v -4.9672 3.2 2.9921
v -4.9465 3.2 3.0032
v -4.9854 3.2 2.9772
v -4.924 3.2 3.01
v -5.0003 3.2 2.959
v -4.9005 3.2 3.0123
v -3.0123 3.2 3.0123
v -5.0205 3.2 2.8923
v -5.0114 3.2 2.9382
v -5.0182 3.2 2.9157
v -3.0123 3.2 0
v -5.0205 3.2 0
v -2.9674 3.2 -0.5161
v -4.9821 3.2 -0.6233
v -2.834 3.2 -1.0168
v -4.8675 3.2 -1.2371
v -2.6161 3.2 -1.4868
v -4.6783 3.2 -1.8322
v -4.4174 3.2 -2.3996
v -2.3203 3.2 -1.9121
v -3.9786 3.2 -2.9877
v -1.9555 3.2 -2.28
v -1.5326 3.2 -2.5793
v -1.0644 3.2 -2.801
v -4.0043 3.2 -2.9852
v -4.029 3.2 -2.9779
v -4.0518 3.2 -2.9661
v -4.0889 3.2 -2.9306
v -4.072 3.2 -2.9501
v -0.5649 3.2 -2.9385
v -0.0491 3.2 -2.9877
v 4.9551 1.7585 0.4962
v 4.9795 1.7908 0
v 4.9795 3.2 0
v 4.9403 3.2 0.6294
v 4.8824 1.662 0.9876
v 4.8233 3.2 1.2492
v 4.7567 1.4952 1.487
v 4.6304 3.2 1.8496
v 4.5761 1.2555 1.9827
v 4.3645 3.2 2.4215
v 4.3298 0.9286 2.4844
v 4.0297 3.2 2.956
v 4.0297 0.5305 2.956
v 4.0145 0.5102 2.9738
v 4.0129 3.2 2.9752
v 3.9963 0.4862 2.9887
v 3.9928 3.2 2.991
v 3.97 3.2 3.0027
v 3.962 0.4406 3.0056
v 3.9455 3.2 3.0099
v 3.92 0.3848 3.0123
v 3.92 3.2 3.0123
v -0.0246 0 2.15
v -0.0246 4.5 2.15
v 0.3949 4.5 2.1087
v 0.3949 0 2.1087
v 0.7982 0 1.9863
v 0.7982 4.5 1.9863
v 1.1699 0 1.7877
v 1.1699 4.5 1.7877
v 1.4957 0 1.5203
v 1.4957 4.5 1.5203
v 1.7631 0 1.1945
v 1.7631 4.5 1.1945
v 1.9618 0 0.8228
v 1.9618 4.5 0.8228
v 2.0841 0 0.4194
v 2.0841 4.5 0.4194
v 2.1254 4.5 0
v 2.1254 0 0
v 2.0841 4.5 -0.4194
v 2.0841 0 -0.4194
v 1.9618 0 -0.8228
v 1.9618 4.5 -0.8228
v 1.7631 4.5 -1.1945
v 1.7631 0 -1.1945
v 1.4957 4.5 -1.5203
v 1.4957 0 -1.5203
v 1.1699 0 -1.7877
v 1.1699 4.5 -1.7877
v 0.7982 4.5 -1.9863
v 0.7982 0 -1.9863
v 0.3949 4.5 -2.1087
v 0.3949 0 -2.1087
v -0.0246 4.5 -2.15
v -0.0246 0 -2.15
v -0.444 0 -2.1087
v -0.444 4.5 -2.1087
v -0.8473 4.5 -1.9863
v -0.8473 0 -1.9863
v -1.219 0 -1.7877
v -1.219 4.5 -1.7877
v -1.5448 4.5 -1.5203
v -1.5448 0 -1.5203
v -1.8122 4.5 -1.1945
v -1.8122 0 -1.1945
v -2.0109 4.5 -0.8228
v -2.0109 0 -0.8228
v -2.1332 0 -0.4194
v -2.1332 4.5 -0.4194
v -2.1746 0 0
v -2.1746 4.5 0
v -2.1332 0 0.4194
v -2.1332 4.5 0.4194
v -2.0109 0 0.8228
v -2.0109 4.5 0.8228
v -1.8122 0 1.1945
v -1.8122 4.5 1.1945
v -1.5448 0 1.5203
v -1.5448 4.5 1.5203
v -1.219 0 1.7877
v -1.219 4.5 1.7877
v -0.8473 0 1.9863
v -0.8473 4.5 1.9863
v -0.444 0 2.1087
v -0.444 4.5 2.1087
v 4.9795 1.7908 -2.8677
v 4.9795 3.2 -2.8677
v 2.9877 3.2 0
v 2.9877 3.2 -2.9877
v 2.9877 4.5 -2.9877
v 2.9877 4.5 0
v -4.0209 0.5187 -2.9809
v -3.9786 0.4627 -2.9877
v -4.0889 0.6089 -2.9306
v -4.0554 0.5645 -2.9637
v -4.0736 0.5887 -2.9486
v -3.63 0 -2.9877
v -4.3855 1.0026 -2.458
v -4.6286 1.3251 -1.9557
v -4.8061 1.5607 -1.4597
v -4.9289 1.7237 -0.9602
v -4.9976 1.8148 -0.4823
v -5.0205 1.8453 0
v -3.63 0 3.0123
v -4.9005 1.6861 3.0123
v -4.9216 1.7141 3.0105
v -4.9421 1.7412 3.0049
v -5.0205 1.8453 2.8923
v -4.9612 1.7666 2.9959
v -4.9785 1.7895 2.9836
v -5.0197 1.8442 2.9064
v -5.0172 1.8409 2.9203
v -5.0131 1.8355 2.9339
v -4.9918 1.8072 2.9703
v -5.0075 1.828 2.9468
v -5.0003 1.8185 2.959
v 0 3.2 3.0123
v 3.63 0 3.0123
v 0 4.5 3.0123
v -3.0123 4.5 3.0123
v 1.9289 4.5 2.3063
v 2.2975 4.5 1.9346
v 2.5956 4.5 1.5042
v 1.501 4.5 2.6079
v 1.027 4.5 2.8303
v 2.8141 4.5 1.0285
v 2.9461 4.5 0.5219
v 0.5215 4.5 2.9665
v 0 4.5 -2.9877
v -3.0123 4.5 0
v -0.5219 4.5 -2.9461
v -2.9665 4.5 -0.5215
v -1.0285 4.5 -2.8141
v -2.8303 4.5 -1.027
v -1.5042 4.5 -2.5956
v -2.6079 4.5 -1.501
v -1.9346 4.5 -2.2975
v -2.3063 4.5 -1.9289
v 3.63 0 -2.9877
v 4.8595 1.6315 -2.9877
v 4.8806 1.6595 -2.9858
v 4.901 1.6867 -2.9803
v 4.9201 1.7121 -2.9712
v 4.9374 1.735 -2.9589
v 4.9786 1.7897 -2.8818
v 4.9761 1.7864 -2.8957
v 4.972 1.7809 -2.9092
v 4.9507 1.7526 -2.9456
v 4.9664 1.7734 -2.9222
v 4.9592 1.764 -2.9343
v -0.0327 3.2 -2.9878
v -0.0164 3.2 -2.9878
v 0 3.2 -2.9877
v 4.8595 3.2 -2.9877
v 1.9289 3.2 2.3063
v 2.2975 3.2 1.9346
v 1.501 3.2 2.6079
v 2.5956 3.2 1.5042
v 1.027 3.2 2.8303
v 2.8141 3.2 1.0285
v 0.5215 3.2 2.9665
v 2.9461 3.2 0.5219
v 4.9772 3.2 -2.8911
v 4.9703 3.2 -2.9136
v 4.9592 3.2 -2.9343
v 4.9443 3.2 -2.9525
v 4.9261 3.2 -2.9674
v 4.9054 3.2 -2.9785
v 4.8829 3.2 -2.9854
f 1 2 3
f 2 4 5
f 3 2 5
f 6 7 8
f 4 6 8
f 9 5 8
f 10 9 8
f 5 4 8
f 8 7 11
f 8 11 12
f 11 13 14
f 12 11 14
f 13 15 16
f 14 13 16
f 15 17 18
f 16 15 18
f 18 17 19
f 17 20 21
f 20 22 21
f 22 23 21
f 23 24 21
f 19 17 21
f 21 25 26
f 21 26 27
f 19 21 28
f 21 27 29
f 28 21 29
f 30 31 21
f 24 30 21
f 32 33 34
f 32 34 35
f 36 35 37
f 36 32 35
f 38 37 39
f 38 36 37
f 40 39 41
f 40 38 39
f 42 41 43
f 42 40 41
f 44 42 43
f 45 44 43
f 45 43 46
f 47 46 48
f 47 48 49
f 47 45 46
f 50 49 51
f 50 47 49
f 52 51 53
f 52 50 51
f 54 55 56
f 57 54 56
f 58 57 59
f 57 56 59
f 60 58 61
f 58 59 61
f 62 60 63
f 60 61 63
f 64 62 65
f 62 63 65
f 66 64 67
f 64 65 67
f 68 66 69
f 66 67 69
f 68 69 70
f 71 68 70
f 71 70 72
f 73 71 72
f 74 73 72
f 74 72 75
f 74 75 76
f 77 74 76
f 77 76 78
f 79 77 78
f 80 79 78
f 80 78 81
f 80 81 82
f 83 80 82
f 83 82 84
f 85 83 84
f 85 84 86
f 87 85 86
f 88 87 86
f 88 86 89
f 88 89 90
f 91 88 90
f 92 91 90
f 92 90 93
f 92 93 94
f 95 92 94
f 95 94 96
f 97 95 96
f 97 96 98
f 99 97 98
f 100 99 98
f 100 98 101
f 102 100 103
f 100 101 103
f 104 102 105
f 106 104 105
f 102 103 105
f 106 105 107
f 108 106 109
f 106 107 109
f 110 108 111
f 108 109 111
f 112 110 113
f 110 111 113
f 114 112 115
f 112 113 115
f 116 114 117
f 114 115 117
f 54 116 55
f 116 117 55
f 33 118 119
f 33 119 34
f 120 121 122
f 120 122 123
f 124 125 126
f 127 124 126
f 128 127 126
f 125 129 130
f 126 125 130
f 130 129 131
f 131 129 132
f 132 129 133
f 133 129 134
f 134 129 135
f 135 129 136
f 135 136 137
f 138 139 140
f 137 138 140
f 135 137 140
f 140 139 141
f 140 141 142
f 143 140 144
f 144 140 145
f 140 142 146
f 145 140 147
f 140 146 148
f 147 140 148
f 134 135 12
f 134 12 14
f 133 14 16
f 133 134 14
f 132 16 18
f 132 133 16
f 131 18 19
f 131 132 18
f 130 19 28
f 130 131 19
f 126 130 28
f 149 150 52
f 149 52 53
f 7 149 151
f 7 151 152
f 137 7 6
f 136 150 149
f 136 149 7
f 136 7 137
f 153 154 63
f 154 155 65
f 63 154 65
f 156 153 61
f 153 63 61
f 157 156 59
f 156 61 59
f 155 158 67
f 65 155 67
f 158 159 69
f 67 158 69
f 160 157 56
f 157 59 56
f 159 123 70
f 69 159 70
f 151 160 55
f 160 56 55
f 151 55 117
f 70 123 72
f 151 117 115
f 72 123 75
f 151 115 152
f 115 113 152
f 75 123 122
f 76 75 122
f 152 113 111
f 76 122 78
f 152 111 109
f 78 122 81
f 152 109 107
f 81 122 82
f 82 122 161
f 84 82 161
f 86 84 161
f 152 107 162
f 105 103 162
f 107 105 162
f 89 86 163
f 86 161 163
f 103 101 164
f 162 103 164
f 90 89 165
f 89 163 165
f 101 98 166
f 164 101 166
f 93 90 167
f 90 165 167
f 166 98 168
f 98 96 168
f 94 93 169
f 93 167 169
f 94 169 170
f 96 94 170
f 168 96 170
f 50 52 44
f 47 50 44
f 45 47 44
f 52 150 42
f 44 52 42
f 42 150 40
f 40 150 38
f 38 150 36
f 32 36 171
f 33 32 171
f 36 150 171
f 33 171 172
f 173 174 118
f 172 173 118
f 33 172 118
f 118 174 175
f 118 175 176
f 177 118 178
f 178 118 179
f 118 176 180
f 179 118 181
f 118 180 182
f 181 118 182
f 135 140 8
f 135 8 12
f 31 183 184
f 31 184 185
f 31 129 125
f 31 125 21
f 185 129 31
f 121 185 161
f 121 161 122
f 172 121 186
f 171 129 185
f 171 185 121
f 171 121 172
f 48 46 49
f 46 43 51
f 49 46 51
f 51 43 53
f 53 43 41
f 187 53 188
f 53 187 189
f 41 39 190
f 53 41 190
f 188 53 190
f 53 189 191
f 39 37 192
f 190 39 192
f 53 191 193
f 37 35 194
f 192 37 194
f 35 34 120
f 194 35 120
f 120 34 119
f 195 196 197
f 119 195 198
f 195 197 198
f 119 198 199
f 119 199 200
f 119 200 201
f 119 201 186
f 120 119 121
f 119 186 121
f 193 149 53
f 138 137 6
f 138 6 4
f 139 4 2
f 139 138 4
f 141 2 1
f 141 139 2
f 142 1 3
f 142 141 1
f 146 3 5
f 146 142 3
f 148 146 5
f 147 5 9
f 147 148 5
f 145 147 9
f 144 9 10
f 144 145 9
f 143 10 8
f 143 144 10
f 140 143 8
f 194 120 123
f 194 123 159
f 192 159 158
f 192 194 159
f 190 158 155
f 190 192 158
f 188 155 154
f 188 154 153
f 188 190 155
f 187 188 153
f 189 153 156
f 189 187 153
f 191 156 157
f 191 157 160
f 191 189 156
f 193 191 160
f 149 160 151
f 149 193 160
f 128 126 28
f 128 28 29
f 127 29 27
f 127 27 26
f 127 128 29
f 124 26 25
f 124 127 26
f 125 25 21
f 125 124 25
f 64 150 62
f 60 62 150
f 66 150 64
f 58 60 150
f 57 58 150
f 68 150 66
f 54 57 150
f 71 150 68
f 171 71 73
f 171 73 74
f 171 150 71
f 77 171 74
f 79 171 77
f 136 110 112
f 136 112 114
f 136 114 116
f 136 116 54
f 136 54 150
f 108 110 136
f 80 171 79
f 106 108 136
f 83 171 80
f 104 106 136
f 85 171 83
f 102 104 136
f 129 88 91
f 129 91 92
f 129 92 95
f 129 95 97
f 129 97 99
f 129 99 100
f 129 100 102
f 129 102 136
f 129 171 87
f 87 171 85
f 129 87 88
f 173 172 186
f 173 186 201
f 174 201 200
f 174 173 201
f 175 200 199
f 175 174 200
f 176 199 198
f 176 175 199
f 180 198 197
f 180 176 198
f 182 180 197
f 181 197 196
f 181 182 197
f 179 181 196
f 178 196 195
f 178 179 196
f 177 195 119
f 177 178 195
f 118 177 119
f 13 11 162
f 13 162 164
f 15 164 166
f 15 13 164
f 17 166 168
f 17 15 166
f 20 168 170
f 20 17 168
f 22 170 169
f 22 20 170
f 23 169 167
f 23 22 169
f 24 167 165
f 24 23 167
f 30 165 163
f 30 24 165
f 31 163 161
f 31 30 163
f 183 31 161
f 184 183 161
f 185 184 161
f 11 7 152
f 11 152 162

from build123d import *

# Parameters (mm, degrees)
EXTRUDE_1_DEPTH     = 3.2
EXTRUDE_2_DEPTH     = 1.3
CUT_EXTRUDE_1_DEPTH = 4.65
CUT_EXTRUDE_2_REACH = 9.384
SKETCH_4_R          = 2.15


with BuildPart() as part:
    # 草图1 → 凸台-拉伸1 (new body)
    with BuildSketch(Plane(origin=(0, 0, 0), x_dir=(1, 0, 0), z_dir=(0, 1, 0))):
        with BuildLine():
            Line((3.92, -3.012326357), (-4.900543928, -3.012326357))
            ThreePointArc((-4.900543928, -3.012326357), (-4.985396742, -2.97717917), (-5.020543928, -2.892326357))
            Line((-5.020543928, -2.892326357), (-5.020543928, 0))
            ThreePointArc((-5.020543928, 0), (-4.782016181, 1.53758289), (-4.088854807, 2.930631324))
            ThreePointArc((-4.088854807, 2.930631324), (-4.040689897, 2.972567944), (-3.978638656, 2.987673643))
            Line((-3.978638656, 2.987673643), (4.859456072, 2.987673643))
            ThreePointArc((4.859456072, 2.987673643), (4.944308886, 2.952526457), (4.979456072, 2.867673643))
            Line((4.979456072, 2.867673643), (4.979456072, 0))
            ThreePointArc((4.979456072, 0), (4.736196095, -1.552389562), (4.029736524, -2.955957745))
            ThreePointArc((4.029736524, -2.955957745), (3.98168372, -2.997410155), (3.92, -3.012326357))
        make_face()
    extrude(amount=EXTRUDE_1_DEPTH)

    # 草图2 → 凸台-拉伸2 (add)
    with BuildSketch(Plane(origin=(0, 3.2, 0), x_dir=(1, 0, 0), z_dir=(0, 1, 0))):
        with BuildLine():
            Line((0, -3.012326357), (-3.012326357, -3.012326357))
            Line((-3.012326357, -3.012326357), (-3.012326357, 0))
            ThreePointArc((-3.012326357, 0), (-2.128529169, 2.12133825), (0, 2.987673643))
            Line((0, 2.987673643), (2.987673643, 2.987673643))
            Line((2.987673643, 2.987673643), (2.987673643, 0))
            ThreePointArc((2.987673643, 0), (2.12133825, -2.128529169), (0, -3.012326357))
        make_face()
    extrude(amount=EXTRUDE_2_DEPTH)

    # 草图3 → 切除-拉伸1 (cut, symmetric)
    with BuildSketch(Plane.XY):
        Polygon((5.020543928, 0), (3.63, 0), (5.020543928, 1.845314119), align=None)
        Polygon((-3.63, 0), (-5.020543928, 1.845314119), (-5.020543928, 0), align=None)
    extrude(amount=CUT_EXTRUDE_1_DEPTH, both=True, mode=Mode.SUBTRACT)

    # 草图4 → 切除-拉伸2 (cut, up to next)
    with BuildSketch(Plane(origin=(0, 4.5, 0), x_dir=(1, 0, 0), z_dir=(0, 1, 0)), mode=Mode.PRIVATE) as cut_extrude_2_sk1:
        with Locations(Location((-0.024551835, 0, 0), (0, 0, 270))):
            Circle(SKETCH_4_R)
    cut_extrude_2_tool1 = extrude(cut_extrude_2_sk1.sketch, amount=-CUT_EXTRUDE_2_REACH, mode=Mode.PRIVATE) & part.part
    add(cut_extrude_2_tool1.solids().sort_by_distance((-0.024552, 4.5, 0))[0], mode=Mode.SUBTRACT)


solid = part.part
